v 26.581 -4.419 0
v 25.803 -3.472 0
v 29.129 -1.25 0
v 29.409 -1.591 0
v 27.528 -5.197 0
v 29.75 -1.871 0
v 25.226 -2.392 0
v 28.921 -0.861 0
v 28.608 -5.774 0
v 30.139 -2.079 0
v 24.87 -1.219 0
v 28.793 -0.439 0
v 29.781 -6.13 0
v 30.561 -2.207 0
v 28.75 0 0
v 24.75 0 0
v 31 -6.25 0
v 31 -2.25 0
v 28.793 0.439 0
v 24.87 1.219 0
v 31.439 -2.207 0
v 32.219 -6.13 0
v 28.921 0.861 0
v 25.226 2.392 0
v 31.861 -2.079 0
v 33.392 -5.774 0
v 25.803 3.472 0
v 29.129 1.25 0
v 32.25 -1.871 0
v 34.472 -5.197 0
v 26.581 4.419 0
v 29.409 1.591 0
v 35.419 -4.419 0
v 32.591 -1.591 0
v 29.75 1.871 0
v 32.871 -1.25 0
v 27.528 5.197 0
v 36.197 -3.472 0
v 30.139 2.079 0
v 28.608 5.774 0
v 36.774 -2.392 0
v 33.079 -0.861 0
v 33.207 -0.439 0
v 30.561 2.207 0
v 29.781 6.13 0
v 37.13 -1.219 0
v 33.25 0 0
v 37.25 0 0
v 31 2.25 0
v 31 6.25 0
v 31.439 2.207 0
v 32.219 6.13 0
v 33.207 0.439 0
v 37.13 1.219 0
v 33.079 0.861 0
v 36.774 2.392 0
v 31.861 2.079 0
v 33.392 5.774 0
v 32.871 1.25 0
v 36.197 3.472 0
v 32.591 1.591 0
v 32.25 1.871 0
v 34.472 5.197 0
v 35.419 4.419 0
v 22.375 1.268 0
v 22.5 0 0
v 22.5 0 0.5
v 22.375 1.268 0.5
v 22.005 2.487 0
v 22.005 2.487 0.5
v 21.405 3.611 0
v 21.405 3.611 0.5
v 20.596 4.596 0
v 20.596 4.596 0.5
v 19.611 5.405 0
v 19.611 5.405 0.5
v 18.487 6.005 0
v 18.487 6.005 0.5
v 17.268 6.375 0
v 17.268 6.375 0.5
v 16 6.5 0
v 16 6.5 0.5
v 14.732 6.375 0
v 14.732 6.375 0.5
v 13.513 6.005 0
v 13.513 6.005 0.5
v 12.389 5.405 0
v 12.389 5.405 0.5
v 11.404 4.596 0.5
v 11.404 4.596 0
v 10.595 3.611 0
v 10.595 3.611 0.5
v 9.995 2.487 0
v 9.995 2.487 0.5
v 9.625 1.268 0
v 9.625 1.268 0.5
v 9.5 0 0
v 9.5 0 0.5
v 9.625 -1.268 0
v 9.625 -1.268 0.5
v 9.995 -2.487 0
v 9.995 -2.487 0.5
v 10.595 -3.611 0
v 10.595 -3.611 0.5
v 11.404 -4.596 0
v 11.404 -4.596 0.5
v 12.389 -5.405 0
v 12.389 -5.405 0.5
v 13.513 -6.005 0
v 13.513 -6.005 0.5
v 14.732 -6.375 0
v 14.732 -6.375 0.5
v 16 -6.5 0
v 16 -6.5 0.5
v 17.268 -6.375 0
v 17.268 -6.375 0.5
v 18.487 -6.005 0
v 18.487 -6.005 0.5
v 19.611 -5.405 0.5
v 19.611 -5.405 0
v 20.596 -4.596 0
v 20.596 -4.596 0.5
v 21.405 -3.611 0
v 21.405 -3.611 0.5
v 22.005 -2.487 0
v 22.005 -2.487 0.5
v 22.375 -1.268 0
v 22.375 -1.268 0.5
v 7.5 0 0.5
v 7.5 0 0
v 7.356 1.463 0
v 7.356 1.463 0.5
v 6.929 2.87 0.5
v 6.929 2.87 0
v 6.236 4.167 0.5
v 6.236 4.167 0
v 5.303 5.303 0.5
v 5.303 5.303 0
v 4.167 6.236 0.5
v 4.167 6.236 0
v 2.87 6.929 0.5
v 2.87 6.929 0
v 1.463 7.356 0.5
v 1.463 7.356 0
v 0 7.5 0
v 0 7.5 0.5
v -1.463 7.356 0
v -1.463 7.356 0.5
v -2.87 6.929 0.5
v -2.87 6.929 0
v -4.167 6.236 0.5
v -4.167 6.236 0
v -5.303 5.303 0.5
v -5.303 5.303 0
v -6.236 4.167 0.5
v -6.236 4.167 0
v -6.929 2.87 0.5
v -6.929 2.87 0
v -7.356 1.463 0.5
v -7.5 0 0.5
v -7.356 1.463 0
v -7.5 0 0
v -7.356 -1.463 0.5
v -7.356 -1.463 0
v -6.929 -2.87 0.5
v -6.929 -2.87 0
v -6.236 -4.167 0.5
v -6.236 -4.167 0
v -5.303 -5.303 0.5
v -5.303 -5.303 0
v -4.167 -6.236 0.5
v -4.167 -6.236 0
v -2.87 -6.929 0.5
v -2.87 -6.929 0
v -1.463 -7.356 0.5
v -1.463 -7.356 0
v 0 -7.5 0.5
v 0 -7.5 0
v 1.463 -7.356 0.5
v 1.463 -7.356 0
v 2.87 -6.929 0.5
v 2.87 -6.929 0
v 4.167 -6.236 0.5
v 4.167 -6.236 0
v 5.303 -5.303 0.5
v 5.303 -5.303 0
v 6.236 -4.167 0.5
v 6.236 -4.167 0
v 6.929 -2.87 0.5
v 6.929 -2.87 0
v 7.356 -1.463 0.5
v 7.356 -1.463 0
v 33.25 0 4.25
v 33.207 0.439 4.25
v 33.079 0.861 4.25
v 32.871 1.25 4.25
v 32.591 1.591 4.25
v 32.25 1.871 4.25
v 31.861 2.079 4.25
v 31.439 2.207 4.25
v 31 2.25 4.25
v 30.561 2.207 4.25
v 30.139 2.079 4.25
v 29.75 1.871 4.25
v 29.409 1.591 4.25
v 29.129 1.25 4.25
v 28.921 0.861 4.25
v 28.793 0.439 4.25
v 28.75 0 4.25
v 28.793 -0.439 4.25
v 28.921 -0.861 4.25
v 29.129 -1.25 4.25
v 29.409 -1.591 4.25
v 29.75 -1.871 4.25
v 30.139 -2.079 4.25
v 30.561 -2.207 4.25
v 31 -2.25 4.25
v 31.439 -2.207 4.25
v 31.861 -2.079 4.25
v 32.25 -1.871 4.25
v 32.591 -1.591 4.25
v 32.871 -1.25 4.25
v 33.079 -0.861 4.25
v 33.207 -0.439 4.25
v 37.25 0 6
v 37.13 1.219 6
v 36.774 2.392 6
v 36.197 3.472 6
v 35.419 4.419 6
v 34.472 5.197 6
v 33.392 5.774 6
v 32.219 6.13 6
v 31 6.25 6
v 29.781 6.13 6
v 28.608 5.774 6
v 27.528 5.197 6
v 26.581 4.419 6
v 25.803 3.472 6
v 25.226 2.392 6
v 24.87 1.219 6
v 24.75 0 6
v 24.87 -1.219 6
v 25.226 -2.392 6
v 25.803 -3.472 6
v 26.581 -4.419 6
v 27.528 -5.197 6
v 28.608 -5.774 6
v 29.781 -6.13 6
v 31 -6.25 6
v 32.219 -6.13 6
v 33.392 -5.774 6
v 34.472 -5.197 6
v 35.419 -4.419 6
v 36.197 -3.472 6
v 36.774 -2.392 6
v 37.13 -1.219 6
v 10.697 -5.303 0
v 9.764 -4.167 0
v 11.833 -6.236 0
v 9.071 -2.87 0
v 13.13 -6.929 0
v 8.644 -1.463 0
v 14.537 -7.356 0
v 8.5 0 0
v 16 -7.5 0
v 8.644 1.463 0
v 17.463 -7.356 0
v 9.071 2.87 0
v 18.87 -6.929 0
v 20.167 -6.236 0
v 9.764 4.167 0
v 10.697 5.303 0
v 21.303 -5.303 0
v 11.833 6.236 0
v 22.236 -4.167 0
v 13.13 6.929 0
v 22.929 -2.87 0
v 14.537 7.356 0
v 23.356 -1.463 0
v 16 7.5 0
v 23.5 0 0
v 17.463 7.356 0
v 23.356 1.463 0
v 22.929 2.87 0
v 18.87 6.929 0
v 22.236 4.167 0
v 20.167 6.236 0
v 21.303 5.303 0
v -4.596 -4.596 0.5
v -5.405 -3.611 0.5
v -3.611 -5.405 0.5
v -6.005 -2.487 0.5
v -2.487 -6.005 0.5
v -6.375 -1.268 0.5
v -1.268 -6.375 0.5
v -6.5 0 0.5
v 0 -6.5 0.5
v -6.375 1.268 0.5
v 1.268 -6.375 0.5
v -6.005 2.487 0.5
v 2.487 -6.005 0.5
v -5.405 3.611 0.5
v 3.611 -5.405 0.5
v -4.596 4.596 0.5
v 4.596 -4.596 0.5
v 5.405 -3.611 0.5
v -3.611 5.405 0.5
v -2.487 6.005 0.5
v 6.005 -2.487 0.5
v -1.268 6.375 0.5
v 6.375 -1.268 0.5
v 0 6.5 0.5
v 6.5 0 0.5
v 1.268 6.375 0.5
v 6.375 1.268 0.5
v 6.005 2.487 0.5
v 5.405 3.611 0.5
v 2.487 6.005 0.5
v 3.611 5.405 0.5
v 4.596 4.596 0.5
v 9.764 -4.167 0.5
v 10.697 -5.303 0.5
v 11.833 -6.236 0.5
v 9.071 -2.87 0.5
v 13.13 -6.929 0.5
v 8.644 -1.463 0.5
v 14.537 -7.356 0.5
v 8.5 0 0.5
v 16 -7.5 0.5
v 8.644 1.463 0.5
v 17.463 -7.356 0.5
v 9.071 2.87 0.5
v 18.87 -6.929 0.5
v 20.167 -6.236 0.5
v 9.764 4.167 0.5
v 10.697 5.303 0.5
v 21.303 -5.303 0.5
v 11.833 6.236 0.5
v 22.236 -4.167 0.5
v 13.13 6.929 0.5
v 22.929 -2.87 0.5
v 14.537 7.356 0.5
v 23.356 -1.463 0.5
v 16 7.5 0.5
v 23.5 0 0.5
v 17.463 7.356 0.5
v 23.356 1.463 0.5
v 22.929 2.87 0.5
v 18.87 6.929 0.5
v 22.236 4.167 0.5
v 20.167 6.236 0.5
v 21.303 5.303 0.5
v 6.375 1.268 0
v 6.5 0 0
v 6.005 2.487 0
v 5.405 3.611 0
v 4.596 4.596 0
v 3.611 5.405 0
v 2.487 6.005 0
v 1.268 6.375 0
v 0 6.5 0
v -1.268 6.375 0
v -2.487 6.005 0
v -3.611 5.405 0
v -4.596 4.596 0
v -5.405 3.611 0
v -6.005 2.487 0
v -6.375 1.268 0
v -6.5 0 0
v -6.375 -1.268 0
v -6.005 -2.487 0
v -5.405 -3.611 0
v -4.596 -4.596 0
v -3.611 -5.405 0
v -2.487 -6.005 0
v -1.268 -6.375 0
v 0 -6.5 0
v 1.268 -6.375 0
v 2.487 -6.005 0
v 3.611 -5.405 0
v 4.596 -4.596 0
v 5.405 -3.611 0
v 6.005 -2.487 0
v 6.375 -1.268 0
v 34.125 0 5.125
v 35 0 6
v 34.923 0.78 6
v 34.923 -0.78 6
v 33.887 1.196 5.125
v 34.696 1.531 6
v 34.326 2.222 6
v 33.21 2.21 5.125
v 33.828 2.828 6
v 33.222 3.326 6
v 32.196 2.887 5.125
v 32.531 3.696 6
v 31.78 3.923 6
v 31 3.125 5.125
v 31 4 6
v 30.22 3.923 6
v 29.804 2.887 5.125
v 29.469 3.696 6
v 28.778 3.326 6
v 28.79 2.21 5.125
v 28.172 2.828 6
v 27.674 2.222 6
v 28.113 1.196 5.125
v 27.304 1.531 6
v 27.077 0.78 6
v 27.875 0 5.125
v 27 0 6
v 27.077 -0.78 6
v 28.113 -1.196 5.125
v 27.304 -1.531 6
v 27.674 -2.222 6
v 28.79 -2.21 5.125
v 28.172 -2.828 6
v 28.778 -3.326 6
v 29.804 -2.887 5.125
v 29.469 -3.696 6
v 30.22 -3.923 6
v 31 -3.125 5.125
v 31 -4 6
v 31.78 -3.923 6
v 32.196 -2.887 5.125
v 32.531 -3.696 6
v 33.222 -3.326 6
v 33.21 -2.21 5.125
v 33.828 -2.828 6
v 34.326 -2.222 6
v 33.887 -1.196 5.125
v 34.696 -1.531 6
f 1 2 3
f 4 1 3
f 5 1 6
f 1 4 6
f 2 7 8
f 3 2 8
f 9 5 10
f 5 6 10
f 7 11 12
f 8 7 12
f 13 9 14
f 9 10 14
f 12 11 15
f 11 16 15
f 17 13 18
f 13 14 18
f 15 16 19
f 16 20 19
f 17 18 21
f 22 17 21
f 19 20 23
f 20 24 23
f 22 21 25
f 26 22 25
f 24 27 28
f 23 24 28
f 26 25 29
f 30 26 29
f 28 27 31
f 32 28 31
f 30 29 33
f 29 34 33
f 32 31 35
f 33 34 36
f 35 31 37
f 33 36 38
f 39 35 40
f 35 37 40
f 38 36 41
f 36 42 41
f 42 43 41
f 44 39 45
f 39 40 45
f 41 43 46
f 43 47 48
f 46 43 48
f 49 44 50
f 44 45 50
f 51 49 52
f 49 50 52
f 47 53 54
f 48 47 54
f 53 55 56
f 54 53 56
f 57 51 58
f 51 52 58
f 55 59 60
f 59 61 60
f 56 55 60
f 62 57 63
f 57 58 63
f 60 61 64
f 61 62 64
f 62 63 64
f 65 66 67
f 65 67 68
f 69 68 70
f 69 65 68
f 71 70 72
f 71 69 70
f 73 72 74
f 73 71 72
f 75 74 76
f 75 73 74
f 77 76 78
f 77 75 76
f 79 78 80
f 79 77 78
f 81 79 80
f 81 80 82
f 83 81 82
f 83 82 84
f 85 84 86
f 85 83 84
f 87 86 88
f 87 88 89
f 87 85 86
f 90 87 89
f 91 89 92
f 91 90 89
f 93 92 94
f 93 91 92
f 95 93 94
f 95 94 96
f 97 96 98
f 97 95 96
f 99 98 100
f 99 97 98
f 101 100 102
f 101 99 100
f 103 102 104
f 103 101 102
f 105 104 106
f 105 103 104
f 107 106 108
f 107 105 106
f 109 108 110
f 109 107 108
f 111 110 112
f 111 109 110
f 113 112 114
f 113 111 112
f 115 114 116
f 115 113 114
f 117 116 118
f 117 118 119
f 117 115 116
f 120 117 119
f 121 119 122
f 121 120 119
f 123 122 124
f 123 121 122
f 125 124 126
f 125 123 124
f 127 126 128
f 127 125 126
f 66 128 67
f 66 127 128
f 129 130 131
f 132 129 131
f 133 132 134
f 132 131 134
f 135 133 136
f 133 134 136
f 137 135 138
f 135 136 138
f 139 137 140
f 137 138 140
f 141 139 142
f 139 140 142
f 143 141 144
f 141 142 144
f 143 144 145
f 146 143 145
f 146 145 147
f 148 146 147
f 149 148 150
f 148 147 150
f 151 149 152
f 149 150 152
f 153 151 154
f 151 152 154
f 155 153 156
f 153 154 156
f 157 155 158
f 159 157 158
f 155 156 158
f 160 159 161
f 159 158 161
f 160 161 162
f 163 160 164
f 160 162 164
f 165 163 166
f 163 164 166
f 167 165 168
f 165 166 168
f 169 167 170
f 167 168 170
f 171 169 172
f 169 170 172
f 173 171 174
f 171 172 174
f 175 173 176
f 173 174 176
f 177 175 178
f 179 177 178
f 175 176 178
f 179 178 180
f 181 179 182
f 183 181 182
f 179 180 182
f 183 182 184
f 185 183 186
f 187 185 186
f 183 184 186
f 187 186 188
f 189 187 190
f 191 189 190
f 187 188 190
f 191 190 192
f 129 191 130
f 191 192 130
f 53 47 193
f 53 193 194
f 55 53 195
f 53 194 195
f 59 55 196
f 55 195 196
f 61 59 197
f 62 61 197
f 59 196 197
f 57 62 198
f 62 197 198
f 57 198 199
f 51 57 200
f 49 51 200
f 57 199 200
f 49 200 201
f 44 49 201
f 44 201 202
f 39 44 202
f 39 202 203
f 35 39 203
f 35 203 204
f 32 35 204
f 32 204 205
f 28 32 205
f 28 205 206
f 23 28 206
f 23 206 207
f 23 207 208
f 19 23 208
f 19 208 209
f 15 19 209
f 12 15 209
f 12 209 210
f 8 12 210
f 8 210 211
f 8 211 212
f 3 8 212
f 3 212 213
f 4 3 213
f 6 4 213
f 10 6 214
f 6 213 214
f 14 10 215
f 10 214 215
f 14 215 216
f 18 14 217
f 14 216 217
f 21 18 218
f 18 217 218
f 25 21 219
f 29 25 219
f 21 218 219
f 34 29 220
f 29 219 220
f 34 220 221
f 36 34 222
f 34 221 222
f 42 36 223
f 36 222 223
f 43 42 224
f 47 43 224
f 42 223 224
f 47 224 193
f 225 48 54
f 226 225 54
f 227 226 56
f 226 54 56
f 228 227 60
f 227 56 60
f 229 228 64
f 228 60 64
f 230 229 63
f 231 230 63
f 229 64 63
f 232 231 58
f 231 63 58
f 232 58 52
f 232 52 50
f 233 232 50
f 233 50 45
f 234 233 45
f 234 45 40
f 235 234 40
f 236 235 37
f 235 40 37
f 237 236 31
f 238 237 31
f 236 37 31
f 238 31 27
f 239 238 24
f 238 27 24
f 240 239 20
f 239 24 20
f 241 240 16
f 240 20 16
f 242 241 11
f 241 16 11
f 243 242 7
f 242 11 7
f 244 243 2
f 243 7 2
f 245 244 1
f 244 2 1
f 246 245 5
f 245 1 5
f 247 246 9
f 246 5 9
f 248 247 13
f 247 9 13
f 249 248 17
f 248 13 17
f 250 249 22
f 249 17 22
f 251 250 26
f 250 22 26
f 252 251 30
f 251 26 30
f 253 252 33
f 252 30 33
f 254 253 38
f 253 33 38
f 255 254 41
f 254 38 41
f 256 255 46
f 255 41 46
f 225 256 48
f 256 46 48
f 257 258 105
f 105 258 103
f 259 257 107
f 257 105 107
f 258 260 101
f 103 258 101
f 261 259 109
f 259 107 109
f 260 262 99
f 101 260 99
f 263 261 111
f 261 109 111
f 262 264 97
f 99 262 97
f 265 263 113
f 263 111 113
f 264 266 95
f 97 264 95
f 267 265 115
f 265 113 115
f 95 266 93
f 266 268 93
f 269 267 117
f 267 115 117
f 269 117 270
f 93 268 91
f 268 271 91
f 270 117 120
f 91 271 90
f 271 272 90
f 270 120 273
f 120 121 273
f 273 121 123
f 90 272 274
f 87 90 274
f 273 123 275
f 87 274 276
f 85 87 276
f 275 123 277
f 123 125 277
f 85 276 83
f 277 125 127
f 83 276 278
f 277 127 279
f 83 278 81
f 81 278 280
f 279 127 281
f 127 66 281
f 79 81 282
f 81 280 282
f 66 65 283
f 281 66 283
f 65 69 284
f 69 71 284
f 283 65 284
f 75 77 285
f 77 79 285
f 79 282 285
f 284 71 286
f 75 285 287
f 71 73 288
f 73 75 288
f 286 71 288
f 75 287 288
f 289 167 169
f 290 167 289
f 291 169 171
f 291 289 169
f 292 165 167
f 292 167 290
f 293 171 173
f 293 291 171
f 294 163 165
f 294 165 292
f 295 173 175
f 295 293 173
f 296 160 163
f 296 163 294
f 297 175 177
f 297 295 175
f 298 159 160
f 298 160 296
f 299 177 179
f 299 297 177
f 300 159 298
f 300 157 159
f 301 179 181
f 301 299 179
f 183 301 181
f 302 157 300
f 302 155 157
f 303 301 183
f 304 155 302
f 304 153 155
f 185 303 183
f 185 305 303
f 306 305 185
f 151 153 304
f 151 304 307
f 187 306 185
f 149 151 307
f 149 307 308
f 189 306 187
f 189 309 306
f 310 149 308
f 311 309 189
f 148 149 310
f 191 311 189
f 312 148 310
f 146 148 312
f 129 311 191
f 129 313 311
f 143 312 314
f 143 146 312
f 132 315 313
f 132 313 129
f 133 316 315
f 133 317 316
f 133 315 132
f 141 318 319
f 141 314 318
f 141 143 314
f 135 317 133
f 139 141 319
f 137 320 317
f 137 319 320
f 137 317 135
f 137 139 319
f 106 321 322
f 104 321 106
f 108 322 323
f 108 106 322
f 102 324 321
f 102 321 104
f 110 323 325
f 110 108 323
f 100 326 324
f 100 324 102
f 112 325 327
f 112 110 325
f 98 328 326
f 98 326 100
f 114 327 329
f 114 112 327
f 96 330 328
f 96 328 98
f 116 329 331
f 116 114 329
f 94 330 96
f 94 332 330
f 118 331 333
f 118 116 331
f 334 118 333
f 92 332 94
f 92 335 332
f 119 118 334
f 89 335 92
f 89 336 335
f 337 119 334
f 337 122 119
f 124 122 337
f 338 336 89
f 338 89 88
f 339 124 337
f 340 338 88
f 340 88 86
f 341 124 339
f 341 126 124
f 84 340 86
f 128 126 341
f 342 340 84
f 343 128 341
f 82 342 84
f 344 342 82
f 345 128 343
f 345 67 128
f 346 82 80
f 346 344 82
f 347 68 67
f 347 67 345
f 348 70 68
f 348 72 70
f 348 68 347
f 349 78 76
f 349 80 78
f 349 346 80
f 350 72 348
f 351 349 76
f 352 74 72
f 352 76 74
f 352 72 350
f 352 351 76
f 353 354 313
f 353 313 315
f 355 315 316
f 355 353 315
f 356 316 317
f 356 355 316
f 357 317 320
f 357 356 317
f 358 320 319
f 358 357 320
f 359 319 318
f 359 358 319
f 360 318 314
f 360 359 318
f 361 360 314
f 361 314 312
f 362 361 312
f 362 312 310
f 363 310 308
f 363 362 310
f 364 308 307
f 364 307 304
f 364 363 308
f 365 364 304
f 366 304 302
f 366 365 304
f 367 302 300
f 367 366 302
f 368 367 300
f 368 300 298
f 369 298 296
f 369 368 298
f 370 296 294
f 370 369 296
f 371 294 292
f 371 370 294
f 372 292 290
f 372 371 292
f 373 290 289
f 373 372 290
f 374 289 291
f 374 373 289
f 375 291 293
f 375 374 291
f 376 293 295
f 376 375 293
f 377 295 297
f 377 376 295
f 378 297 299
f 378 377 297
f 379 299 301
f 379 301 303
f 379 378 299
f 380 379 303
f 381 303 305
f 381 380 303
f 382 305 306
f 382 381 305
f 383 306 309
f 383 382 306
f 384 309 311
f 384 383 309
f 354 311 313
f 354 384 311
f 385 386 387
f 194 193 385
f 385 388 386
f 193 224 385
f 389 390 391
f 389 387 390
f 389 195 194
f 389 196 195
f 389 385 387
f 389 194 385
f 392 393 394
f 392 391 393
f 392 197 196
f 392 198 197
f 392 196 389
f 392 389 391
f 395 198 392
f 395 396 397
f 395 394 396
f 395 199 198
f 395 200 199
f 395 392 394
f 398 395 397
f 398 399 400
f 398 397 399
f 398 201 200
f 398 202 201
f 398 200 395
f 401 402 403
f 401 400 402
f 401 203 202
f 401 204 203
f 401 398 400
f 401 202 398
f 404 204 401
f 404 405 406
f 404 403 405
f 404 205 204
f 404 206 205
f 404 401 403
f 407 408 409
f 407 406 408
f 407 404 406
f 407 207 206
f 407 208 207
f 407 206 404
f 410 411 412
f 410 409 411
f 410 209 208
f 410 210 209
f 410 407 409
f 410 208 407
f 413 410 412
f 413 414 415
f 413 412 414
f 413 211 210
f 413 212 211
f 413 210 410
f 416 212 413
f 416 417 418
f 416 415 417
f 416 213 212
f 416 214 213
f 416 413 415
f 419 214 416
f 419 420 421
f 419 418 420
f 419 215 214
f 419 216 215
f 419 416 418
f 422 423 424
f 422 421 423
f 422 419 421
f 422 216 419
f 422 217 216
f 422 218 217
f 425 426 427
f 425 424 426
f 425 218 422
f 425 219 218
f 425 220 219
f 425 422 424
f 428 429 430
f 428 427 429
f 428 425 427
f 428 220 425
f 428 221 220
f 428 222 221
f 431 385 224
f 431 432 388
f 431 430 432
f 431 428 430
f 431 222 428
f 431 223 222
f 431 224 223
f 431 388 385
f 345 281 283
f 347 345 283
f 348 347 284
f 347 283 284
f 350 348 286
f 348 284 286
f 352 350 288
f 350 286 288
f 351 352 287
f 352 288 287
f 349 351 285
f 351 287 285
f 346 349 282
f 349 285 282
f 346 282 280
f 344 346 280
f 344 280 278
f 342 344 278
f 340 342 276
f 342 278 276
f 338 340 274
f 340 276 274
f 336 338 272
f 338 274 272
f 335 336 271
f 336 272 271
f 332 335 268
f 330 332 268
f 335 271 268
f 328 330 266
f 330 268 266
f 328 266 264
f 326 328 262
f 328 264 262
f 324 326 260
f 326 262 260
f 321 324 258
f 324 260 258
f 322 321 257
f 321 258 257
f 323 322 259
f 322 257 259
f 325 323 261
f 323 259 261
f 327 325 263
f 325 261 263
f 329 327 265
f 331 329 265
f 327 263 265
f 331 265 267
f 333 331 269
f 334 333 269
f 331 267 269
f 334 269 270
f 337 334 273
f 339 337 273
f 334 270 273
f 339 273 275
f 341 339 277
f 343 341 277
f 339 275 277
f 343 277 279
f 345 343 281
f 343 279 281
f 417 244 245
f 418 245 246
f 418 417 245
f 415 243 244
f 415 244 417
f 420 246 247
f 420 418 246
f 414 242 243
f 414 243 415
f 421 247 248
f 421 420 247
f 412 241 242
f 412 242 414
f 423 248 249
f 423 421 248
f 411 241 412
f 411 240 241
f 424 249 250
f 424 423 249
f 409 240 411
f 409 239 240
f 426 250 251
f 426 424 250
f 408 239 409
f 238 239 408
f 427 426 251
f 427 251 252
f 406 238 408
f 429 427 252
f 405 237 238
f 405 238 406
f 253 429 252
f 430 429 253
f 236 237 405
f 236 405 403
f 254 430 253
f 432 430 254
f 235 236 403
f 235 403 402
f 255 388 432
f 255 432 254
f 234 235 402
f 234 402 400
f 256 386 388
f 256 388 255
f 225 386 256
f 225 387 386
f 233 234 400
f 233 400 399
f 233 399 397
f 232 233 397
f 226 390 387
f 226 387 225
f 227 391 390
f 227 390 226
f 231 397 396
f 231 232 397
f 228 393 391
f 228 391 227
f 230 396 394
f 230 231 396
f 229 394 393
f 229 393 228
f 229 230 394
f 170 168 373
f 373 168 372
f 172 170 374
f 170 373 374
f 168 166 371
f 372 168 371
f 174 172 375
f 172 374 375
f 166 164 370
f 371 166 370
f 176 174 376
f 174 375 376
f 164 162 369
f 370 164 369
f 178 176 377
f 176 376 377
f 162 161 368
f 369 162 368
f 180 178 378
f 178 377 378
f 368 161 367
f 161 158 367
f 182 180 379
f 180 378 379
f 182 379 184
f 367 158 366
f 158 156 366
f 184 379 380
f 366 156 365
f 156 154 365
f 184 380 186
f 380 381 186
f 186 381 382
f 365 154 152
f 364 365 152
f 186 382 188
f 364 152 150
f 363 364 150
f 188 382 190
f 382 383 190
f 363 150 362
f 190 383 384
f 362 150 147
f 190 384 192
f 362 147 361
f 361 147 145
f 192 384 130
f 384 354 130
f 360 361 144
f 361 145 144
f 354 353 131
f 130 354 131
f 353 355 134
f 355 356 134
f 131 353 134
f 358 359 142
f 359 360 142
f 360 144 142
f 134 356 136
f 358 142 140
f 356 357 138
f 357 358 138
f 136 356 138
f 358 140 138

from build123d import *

# Parameters (mm, degrees)
F0_R     = 7.5
F0_R_2   = 6.5
F1_DEPTH = 0.5
F2_R     = 6.25
F3_DEPTH = 6
F4_R     = 4
F5_DEPTH = 2
F5_TAPER = 45
F6_R     = 2.25
F7_DEPTH = 6


with BuildPart() as f1:
    # F0 (on Top) → F1 (new body)
    with BuildSketch(Plane.XY):
        Circle(F0_R)
        Circle(F0_R_2, mode=Mode.SUBTRACT)
    extrude(amount=F1_DEPTH)


with BuildPart() as f1b:
    # F0 (on Top) → F1, piece 2 (new body)
    with BuildSketch(Plane.XY):
        with Locations((16, 0)):
            Circle(F0_R)
        with Locations((16, 0)):
            Circle(F0_R_2, mode=Mode.SUBTRACT)
    extrude(amount=F1_DEPTH)


with BuildPart() as f3:
    # F2 (on Top) → F3 (new body)
    with BuildSketch(Plane.XY):
        with Locations((31, 0)):
            Circle(F2_R)
    extrude(amount=F3_DEPTH)

    # F4 (on face) → F5 (cut)
    with BuildSketch(Plane.XY.offset(6)):
        with Locations((31, 0)):
            Circle(F4_R)
    extrude(amount=-F5_DEPTH, taper=F5_TAPER, mode=Mode.SUBTRACT)

    # F6 (on face) → F7 (cut, through all)
    with BuildSketch(Plane.XY.offset(6)):
        with Locations((31, 0)):
            Circle(F6_R)
    extrude(amount=-F7_DEPTH, mode=Mode.SUBTRACT)


solid = Compound([f1.part, f1b.part, f3.part])
